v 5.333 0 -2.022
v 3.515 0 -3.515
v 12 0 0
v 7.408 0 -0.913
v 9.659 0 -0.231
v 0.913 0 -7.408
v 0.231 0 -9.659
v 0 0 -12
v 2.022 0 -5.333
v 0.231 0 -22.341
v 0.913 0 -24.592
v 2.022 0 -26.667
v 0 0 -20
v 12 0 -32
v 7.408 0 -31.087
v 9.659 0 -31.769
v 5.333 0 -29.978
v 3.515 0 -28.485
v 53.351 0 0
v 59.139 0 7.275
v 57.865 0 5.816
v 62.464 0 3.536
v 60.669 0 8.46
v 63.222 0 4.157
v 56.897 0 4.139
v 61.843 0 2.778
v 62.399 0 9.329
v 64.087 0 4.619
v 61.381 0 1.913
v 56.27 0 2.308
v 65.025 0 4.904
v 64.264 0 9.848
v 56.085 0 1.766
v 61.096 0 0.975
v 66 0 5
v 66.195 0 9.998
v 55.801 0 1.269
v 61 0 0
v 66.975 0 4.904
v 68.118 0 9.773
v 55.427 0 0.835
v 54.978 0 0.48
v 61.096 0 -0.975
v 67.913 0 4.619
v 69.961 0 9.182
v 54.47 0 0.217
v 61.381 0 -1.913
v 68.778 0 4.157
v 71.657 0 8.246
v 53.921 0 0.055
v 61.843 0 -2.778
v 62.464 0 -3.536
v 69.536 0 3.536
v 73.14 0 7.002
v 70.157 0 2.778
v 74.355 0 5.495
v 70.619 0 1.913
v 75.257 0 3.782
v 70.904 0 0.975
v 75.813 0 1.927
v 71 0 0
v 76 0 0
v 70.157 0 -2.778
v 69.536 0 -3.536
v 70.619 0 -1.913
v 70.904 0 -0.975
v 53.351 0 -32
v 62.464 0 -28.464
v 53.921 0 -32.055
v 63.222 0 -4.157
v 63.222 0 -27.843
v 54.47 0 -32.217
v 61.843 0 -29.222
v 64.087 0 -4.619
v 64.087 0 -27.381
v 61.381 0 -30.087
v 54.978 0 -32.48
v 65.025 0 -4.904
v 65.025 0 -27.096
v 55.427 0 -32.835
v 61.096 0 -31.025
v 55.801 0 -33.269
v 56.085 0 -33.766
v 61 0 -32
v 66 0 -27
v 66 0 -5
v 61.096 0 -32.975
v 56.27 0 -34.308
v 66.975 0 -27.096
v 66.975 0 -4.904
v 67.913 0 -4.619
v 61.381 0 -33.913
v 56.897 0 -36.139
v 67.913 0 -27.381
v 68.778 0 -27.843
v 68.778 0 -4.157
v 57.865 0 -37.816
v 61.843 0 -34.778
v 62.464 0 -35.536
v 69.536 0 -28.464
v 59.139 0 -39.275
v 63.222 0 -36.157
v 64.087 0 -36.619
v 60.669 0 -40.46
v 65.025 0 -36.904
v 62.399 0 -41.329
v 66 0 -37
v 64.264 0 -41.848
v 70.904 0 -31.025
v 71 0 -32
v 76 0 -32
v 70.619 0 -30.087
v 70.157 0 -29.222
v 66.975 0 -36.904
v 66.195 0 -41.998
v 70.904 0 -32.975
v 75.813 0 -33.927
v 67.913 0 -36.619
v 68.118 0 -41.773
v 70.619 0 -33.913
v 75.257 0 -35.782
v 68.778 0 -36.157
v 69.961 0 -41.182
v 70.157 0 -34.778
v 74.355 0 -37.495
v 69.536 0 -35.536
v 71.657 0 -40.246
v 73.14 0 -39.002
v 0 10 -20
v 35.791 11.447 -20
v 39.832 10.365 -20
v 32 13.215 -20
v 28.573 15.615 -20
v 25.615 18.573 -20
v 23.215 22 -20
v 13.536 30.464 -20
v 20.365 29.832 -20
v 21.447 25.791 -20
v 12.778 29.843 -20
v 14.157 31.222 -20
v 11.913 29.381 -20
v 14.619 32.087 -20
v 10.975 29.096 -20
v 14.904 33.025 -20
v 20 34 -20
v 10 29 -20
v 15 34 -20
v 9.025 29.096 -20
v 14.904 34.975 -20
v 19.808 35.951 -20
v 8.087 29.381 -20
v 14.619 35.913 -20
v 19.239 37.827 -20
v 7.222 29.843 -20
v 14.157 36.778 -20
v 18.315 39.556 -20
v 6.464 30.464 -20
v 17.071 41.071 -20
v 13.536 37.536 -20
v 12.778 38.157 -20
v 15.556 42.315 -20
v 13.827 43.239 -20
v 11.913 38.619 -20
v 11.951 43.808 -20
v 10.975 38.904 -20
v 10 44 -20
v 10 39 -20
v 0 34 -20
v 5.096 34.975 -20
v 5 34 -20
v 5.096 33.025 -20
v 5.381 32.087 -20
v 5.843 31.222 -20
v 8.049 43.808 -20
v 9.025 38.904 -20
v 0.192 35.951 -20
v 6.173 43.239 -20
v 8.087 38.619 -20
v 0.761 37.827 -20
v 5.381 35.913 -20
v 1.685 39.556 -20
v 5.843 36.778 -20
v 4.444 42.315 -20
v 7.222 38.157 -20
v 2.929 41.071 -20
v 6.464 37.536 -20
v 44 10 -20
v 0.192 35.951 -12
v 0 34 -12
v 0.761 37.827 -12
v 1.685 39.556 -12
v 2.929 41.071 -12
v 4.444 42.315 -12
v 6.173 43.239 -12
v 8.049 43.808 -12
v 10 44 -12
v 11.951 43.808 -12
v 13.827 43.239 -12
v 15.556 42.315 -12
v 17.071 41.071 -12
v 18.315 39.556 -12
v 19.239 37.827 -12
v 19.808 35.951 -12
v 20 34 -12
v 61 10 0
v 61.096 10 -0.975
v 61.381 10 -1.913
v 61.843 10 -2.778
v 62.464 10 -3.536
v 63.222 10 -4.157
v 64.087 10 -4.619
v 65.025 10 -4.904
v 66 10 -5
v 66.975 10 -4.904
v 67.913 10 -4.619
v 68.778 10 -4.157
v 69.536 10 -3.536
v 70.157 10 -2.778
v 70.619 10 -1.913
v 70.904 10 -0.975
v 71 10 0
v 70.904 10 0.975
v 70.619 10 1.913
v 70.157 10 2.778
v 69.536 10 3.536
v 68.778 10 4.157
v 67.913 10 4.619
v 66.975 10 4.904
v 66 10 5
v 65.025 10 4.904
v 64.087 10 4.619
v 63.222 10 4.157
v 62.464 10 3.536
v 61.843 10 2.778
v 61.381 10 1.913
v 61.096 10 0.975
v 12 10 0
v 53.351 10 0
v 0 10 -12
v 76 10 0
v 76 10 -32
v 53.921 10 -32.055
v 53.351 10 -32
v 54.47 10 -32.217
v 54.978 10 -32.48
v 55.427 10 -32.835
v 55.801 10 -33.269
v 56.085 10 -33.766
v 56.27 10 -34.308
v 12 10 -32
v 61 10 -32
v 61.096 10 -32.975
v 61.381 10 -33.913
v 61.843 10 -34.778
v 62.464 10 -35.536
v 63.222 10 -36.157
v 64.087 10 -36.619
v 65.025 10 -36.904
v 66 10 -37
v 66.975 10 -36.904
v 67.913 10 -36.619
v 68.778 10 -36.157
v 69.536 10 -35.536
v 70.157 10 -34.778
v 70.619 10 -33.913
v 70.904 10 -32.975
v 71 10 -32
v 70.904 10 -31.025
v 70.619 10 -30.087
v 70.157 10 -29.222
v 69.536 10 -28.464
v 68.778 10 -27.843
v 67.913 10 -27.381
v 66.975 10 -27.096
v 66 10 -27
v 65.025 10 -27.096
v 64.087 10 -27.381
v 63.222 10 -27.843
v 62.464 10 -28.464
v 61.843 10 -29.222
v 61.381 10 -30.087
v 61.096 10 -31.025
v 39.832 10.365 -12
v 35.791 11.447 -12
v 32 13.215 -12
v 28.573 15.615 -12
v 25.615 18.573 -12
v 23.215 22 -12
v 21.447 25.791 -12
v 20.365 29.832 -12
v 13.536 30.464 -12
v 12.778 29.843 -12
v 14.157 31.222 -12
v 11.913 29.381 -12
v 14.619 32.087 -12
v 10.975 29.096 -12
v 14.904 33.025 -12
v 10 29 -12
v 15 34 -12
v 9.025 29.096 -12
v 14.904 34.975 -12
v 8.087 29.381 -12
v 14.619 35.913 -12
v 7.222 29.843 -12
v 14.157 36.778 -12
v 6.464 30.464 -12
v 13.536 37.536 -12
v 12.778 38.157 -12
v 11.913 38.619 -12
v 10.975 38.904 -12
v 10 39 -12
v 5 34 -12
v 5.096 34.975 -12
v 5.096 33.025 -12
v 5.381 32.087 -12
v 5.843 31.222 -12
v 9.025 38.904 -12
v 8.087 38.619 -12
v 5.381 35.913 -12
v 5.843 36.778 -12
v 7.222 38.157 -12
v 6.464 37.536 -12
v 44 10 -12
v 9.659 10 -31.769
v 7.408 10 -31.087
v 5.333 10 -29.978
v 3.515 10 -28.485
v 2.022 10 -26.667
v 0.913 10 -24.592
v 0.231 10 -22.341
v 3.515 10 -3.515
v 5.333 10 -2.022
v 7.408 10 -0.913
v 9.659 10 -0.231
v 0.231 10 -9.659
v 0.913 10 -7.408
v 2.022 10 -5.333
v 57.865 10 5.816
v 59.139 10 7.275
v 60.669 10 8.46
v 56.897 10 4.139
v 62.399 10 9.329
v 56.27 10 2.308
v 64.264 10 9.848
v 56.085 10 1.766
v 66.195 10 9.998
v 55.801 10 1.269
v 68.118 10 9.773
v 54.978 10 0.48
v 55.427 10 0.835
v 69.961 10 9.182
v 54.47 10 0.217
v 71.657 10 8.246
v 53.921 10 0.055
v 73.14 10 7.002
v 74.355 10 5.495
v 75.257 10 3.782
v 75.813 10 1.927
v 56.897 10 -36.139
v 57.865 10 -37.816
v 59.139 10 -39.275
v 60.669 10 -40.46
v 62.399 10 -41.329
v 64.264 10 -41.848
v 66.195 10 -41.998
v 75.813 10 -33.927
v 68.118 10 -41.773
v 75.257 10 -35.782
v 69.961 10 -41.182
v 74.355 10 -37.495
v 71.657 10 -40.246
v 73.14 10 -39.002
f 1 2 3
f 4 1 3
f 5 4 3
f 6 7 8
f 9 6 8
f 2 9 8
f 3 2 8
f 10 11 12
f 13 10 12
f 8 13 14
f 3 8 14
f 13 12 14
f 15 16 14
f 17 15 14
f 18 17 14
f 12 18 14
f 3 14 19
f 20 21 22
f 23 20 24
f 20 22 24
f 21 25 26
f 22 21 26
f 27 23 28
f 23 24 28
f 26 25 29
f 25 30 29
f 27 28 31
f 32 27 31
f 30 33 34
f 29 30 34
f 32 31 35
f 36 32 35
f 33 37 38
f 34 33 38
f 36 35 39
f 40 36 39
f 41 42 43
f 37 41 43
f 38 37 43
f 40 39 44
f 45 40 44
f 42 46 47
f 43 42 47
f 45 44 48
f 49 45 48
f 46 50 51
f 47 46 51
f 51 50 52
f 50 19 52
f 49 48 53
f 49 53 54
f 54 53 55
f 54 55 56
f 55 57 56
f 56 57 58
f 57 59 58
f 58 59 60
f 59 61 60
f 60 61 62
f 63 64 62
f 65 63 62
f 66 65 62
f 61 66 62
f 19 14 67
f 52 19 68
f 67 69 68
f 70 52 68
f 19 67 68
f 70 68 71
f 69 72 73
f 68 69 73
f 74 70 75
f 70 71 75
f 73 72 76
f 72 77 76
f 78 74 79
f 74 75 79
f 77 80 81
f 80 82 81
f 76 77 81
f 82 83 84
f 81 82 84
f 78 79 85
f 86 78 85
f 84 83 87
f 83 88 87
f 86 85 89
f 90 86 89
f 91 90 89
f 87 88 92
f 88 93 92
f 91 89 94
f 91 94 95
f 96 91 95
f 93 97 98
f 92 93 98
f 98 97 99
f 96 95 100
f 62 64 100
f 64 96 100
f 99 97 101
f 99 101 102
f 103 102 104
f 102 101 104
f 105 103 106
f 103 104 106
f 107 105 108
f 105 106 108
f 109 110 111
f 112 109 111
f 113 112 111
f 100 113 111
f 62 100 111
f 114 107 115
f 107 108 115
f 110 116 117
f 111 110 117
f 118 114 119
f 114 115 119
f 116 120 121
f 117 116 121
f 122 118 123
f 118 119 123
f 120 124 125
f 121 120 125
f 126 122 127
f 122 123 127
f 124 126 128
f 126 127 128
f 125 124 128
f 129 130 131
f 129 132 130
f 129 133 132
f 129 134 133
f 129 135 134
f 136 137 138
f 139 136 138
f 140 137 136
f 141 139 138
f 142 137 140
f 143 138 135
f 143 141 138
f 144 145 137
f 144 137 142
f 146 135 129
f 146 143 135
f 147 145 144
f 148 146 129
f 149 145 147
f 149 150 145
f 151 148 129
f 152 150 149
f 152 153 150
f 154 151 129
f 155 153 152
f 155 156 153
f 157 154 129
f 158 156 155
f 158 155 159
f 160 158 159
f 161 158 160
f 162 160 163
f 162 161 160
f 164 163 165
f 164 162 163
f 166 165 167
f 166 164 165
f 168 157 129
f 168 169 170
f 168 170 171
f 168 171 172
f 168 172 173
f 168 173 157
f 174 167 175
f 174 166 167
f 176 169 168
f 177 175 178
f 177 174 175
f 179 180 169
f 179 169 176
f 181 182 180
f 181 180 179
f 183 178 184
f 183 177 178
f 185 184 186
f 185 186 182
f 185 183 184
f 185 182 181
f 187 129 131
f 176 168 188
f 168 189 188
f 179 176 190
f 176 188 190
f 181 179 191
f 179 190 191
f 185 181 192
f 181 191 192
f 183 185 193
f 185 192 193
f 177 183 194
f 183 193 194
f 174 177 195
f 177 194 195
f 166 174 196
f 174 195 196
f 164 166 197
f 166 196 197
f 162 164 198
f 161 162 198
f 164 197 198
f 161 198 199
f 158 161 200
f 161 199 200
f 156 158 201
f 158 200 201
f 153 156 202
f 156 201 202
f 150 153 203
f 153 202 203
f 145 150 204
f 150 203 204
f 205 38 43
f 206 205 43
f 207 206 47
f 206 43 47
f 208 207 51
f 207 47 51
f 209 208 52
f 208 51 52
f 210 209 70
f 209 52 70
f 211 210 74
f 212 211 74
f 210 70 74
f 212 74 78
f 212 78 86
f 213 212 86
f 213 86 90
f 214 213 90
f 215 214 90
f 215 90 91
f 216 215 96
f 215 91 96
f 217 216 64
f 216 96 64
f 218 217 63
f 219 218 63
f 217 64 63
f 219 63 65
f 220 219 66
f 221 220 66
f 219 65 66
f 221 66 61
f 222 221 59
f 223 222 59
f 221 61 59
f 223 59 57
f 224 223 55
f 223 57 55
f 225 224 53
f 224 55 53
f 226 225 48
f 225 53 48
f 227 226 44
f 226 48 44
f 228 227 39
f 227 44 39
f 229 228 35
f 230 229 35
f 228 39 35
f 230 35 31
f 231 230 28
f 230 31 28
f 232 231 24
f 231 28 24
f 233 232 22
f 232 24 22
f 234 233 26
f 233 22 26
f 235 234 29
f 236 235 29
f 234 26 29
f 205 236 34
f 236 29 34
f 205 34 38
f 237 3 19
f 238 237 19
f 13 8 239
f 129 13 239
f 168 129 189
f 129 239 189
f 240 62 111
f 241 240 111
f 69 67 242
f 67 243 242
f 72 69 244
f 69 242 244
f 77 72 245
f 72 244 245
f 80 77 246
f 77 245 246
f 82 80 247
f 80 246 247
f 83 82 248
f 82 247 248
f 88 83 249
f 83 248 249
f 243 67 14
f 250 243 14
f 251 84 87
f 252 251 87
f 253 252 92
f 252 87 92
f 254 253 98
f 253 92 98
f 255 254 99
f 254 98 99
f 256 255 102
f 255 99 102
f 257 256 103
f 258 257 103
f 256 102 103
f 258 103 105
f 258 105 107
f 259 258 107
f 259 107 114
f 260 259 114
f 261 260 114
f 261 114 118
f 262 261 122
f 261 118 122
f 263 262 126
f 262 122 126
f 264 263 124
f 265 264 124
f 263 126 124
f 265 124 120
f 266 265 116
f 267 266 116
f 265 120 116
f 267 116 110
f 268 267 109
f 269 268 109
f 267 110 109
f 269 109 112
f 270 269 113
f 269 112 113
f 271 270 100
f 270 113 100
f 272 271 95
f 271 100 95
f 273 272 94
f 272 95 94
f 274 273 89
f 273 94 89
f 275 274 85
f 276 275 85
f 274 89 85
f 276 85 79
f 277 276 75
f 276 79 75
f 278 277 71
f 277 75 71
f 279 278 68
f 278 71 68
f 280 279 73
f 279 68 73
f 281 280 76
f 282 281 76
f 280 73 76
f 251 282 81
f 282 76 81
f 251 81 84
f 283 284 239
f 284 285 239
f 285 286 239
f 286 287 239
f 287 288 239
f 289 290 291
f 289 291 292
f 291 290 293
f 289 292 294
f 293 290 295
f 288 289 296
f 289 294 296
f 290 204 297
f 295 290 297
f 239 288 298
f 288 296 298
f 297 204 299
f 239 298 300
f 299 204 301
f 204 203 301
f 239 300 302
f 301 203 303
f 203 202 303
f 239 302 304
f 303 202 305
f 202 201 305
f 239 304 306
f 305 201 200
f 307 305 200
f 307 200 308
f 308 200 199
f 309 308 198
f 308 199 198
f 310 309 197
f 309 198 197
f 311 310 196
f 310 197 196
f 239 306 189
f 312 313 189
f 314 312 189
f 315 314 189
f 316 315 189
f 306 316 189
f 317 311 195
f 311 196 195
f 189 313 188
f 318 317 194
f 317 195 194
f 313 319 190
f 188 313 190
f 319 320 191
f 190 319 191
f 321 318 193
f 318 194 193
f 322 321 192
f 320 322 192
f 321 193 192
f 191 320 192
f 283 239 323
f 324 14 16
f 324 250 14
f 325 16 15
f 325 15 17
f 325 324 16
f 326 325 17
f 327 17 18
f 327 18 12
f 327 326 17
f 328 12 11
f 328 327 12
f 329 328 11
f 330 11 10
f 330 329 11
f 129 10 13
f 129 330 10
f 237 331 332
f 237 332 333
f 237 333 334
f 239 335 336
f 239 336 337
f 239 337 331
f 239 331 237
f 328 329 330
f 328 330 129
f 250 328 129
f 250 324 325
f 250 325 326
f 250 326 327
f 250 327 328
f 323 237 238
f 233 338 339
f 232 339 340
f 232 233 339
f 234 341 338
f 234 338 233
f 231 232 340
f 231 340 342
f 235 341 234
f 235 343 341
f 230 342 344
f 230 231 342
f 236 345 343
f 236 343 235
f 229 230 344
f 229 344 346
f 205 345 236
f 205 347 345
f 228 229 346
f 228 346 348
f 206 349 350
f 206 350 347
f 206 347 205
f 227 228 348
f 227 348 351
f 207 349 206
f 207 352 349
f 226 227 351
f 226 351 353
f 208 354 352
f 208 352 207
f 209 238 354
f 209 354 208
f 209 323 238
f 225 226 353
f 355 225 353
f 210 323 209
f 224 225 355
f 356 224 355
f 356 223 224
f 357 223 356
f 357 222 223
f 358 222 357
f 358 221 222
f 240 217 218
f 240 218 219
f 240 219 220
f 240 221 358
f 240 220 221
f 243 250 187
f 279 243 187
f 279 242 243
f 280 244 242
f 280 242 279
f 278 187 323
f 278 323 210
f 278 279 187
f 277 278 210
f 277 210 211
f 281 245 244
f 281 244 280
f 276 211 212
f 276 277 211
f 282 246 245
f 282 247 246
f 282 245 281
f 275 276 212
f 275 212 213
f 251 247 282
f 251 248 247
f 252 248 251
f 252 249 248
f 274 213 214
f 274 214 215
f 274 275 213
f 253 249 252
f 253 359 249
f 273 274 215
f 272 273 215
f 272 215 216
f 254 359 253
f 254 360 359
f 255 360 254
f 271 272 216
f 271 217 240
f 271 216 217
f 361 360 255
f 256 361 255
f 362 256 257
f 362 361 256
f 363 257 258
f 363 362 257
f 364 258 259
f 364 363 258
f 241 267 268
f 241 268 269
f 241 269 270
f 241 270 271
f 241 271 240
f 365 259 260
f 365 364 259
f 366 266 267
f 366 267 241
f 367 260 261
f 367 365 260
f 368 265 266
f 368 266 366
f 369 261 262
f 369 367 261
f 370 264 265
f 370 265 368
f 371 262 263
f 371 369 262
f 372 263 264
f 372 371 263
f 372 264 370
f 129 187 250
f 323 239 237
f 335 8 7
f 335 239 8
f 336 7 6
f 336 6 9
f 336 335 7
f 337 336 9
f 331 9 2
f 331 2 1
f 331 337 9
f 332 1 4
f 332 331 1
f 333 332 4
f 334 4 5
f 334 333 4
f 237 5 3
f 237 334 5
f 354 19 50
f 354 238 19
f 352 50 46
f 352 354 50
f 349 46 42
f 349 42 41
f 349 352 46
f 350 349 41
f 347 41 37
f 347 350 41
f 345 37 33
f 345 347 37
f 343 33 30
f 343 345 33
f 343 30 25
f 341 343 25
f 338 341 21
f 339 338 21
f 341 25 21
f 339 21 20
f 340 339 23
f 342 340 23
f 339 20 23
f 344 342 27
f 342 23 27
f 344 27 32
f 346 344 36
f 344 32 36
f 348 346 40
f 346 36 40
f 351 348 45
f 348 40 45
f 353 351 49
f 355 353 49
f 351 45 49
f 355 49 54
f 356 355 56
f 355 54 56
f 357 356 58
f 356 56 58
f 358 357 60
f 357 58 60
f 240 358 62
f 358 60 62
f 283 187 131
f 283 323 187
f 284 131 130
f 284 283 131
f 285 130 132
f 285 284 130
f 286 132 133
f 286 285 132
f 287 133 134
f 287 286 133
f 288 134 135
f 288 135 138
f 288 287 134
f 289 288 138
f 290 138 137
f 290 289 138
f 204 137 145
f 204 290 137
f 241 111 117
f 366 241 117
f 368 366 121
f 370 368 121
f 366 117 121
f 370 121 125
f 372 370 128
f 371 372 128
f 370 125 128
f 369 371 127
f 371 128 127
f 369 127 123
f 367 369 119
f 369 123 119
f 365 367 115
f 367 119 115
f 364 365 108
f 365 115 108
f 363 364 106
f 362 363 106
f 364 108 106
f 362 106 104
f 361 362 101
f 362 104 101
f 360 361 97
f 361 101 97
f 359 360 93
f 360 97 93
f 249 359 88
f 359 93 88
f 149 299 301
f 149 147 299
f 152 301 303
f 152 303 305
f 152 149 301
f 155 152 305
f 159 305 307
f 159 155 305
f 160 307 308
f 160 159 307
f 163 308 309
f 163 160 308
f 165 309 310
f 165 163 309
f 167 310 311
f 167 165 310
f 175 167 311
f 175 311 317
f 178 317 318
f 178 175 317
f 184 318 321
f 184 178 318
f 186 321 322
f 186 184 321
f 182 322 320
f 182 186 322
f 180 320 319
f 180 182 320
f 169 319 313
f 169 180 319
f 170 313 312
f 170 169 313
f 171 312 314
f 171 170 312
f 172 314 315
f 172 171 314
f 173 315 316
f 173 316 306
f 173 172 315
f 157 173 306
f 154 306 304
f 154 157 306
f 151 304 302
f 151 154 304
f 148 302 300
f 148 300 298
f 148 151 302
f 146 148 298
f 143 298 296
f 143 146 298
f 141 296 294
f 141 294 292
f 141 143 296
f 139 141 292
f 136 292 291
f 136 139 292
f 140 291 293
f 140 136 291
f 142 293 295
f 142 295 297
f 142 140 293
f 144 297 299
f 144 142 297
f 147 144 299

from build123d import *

# Parameters (mm, degrees)
BOSS_EXTRUDE1_DEPTH = 10
FILLET1_R           = 3
FILLET2_R           = 3
FILLET3_R           = 12
FILLET4_R           = 12
SKETCH2_R           = 5
BOSS_EXTRUDE2_DEPTH = 4
FILLET5_R           = 24


with BuildPart() as part:
    # Sketch1 → Boss-Extrude1 (new body)
    with BuildSketch(Plane(origin=(0, 0, 0), x_dir=(1, 0, 0), z_dir=(0, 1, 0))):
        with BuildLine():
            Line((56, 32), (0, 32))
            Line((0, 32), (0, 0))
            Line((0, 0), (56, 0))
            ThreePointArc((56, 0), (66, -10), (76, 0))
            Line((76, 0), (76, 32))
            ThreePointArc((76, 32), (66, 42), (56, 32))
        make_face()
        with BuildLine():
            ThreePointArc((71, 0), (66, -5), (61, 0))
            ThreePointArc((61, 0), (66, 5), (71, 0))
        make_face(mode=Mode.SUBTRACT)
        with BuildLine():
            ThreePointArc((71, 32), (66, 27), (61, 32))
            ThreePointArc((61, 32), (66, 37), (71, 32))
        make_face(mode=Mode.SUBTRACT)
    extrude(amount=BOSS_EXTRUDE1_DEPTH)

    # Fillet1
    fillet1_edges = [part.edges().sort_by_distance(p)[0] for p in [
        (56, 5, 0),
    ]]
    fillet(fillet1_edges, radius=FILLET1_R)

    # Fillet2
    fillet2_edges = [part.edges().sort_by_distance(p)[0] for p in [
        (56, 5, -32),
    ]]
    fillet(fillet2_edges, radius=FILLET2_R)

    # Fillet3
    fillet3_edges = [part.edges().sort_by_distance(p)[0] for p in [
        (0, 5, -32),
    ]]
    fillet(fillet3_edges, radius=FILLET3_R)

    # Fillet4
    fillet4_edges = [part.edges().sort_by_distance(p)[0] for p in [
        (0, 5, 0),
    ]]
    fillet(fillet4_edges, radius=FILLET4_R)

    # Sketch2 → Boss-Extrude2 (add, symmetric)
    with BuildSketch(Plane.XY.offset(-16)):
        with BuildLine():
            Line((0, 10), (0, 34))
            ThreePointArc((0, 34), (10, 44), (20, 34))
            Line((20, 34), (20, 10))
            Line((20, 10), (0, 10))
        make_face()
        with Locations((10, 34)):
            Circle(SKETCH2_R, mode=Mode.SUBTRACT)
    extrude(amount=BOSS_EXTRUDE2_DEPTH, both=True)

    # Fillet5
    fillet5_edges = [part.edges().sort_by_distance(p)[0] for p in [
        (20, 10, -16),
    ]]
    fillet(fillet5_edges, radius=FILLET5_R - 0.0001)  # a hair under: the kernel refuses the full size


solid = part.part
